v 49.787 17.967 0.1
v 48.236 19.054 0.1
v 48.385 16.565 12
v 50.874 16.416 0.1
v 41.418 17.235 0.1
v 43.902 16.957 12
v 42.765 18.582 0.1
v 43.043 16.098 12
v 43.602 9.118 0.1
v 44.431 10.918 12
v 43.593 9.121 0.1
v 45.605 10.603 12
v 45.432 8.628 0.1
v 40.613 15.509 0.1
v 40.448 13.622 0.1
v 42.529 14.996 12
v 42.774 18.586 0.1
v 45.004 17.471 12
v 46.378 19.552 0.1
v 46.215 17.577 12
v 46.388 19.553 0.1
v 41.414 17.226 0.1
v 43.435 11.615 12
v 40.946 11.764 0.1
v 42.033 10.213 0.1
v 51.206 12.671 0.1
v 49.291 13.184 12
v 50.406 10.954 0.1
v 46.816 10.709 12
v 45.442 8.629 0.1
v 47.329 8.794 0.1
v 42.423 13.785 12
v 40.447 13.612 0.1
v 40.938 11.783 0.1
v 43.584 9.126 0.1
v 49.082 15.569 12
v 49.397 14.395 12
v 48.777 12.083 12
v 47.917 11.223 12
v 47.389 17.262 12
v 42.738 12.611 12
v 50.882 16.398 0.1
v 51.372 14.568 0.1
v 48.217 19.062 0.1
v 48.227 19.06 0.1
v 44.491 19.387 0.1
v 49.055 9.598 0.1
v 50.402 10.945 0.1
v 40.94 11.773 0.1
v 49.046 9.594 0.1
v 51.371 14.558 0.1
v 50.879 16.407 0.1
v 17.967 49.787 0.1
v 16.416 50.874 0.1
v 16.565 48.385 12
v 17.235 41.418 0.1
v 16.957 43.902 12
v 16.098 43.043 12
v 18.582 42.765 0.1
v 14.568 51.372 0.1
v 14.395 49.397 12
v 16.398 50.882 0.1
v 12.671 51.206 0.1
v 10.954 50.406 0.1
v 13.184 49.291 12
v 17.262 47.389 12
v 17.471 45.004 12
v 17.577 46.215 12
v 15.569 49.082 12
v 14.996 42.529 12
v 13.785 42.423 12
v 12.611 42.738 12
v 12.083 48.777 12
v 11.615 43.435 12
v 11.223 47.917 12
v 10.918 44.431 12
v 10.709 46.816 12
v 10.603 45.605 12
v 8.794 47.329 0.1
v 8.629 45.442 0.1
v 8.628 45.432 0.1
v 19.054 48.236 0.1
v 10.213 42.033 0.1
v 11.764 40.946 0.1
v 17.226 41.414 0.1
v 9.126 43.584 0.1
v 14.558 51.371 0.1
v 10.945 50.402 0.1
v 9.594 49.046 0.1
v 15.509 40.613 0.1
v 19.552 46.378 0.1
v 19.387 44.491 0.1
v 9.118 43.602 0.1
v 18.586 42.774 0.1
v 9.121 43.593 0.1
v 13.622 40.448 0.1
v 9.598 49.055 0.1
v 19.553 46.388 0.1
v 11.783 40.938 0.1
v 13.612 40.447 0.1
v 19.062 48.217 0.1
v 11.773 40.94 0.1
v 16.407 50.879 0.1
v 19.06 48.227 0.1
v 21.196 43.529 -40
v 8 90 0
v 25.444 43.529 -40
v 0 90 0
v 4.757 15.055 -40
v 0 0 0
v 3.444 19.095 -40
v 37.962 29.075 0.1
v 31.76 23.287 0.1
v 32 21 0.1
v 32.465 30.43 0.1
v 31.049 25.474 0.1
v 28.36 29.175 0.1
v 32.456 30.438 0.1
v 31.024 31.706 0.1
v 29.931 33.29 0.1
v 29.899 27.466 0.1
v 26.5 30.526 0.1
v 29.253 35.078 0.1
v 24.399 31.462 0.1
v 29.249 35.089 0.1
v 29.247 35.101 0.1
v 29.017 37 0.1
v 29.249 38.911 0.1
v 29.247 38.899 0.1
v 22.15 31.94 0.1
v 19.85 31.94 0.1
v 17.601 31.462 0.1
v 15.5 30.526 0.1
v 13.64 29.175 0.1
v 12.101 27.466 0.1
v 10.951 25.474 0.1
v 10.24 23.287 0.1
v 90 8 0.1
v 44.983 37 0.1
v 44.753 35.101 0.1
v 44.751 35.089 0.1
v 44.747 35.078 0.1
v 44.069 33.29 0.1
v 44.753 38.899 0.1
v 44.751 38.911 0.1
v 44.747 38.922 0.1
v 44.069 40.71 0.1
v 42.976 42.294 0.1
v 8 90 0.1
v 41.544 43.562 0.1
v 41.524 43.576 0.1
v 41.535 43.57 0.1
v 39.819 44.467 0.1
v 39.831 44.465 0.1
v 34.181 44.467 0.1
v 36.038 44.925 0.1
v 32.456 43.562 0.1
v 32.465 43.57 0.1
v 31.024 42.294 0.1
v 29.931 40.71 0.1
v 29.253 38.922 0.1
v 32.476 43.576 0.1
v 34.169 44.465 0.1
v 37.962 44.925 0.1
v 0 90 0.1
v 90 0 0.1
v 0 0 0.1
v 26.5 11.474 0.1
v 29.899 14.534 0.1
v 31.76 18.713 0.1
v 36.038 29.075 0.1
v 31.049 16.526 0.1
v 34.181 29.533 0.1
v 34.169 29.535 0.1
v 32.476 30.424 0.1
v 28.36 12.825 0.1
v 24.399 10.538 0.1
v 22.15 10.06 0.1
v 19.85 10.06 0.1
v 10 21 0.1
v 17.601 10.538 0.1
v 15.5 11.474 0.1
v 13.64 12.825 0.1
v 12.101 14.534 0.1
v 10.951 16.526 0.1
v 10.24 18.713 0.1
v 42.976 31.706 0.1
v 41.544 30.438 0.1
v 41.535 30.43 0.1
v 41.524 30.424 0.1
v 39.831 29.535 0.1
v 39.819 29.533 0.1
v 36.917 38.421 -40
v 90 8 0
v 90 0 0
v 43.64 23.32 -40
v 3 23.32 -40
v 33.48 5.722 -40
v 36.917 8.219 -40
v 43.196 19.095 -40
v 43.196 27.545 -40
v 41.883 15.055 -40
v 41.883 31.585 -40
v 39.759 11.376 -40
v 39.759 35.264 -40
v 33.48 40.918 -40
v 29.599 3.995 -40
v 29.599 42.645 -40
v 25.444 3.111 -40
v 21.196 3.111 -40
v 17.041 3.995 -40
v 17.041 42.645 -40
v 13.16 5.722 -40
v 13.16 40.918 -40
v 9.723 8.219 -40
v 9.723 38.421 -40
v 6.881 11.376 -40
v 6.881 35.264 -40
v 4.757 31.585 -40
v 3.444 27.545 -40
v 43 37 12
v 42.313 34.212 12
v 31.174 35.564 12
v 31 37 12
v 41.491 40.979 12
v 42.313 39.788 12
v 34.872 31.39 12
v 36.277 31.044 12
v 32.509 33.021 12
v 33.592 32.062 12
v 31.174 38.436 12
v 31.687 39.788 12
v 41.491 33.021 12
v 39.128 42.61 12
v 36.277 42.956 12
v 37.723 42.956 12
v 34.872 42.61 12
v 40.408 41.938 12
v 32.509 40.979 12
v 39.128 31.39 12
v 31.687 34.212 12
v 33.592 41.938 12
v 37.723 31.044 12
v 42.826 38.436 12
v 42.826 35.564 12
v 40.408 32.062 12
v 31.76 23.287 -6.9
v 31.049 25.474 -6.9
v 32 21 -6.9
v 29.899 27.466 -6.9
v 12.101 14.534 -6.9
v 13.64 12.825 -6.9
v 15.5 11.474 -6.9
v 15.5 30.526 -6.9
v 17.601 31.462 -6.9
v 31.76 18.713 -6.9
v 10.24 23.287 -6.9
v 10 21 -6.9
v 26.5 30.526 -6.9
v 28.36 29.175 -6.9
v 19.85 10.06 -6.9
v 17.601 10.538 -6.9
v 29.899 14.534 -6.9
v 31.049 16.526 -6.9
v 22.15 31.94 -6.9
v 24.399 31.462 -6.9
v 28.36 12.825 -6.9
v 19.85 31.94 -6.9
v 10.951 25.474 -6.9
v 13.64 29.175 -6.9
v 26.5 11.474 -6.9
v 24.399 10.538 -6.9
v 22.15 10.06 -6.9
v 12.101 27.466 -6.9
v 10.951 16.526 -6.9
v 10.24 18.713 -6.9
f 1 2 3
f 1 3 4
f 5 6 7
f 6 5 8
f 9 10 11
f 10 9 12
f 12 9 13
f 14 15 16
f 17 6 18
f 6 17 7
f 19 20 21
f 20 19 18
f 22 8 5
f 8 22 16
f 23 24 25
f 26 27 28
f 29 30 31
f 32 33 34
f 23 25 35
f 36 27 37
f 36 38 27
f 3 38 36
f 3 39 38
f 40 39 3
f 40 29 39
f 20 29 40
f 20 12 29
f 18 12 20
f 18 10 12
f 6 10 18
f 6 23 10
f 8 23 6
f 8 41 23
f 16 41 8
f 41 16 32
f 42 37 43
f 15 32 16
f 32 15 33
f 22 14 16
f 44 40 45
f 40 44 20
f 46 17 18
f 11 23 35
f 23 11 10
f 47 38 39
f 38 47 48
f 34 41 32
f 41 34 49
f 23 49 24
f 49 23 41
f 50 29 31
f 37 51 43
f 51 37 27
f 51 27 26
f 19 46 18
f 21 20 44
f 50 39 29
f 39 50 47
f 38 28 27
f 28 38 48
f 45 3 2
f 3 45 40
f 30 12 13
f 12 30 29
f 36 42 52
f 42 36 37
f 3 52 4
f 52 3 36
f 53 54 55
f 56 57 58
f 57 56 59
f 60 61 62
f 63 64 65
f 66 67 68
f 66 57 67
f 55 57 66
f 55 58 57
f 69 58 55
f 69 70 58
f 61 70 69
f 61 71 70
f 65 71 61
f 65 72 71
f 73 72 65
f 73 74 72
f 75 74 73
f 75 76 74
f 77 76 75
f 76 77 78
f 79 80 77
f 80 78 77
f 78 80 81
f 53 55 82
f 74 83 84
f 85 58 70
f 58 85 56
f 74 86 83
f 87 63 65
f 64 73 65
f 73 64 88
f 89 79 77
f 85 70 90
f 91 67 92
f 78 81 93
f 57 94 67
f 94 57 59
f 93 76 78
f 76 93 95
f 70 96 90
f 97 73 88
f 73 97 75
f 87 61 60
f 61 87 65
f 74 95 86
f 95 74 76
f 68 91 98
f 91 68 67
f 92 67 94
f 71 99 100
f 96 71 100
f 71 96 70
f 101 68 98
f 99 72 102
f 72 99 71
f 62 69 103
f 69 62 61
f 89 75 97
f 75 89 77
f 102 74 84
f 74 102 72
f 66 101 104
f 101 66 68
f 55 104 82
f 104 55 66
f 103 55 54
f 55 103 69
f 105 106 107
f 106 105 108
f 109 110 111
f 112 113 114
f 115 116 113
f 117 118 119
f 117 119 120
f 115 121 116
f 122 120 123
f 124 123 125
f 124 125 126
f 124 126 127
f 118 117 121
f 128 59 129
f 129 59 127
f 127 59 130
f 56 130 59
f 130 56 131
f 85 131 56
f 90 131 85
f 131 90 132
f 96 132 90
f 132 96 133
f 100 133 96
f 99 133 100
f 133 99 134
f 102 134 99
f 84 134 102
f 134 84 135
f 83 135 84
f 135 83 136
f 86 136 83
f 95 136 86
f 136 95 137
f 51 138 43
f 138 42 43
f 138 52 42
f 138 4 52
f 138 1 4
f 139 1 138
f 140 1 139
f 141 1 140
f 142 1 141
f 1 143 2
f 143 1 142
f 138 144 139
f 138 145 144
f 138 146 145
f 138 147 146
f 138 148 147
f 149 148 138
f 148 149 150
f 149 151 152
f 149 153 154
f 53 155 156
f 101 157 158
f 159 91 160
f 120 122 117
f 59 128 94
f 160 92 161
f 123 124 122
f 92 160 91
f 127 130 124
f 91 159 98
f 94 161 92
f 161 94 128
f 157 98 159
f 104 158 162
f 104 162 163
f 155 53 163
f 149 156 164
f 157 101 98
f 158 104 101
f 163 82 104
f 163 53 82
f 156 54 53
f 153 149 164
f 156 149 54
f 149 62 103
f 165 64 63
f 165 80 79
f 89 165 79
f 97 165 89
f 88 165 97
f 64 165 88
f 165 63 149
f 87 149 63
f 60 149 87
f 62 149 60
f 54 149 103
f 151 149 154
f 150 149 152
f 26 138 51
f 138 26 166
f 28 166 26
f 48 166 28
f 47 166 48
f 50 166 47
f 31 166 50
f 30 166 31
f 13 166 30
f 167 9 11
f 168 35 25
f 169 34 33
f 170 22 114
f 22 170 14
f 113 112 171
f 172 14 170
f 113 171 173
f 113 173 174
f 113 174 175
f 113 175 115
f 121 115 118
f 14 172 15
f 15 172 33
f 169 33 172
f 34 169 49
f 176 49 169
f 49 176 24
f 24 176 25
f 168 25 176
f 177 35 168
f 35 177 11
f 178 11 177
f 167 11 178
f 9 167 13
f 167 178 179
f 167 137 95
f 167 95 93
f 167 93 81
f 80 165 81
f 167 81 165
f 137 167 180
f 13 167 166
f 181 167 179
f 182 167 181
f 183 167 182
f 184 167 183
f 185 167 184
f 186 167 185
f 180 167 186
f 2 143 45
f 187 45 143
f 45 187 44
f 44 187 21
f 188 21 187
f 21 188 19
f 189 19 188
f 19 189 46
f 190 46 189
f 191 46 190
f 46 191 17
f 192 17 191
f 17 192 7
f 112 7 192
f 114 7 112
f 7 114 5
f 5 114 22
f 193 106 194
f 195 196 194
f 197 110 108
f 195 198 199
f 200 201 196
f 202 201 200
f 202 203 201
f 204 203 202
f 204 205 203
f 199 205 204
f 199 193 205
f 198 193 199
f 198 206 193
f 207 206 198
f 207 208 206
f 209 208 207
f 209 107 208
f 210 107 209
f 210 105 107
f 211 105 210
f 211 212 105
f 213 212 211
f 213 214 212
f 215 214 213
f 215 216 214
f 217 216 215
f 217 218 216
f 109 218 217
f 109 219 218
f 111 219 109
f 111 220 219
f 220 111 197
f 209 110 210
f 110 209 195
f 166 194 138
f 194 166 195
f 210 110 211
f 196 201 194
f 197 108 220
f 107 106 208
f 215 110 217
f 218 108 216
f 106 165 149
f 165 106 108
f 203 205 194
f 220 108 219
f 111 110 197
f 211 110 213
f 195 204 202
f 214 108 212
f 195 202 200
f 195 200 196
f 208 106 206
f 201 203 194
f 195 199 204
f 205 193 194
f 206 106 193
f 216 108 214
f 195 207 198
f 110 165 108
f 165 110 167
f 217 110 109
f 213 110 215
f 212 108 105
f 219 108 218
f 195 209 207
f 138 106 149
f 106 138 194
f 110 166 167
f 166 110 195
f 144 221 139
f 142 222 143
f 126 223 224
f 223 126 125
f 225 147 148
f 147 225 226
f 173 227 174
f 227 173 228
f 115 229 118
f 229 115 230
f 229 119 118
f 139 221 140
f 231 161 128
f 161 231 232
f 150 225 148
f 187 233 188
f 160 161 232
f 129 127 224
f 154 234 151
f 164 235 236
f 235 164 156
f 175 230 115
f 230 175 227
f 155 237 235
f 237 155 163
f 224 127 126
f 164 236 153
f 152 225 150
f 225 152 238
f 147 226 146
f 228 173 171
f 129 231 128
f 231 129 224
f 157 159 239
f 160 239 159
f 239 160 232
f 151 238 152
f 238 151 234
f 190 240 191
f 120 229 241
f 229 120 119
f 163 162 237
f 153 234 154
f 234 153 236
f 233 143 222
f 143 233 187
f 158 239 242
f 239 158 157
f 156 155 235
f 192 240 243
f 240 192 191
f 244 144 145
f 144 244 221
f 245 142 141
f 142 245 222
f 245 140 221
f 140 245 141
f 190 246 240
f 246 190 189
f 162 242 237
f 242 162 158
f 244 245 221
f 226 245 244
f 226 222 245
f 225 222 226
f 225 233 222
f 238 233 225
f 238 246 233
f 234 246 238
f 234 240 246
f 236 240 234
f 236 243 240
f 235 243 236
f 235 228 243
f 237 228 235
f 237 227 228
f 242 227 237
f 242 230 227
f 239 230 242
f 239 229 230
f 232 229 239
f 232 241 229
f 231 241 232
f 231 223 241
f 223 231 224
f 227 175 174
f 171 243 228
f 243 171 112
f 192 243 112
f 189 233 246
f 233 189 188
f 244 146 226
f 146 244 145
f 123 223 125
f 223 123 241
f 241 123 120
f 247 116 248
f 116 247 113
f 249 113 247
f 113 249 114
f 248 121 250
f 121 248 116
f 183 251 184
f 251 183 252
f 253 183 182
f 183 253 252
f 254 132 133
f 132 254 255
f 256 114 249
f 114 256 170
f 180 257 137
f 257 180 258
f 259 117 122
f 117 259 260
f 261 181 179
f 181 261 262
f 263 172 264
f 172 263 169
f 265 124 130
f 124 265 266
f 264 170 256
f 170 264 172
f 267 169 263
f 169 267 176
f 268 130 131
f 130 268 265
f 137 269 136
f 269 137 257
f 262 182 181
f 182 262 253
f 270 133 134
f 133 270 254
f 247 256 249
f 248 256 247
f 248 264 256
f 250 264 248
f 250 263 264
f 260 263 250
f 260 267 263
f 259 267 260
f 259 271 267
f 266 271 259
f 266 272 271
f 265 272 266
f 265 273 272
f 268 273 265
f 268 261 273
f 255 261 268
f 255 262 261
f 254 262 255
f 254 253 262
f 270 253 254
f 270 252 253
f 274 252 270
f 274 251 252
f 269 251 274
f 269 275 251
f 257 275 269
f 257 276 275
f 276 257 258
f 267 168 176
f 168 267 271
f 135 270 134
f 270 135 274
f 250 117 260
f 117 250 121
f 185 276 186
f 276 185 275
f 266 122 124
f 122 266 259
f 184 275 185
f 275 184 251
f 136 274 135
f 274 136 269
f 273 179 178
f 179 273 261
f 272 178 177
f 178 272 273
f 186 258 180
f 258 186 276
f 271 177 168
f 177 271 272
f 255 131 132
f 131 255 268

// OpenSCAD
extra=8;
base=90;
base_h=40;
pad=0.1;
padd=pad*2;
in=25.4;
felt=1.6*in;
felt_h=1;
from_edge=3;

dip=22;
dip_h=7;
dip_offset=21;
screw_h=12;
big_d2=16;
big_d1=big_d2-4;
small_d2=11;
small_d1=small_d2-4;
big_offset=37;

small_gap=45;
small_offset=30;


module top() {
    difference() {
        cube([base,base,pad]);
        translate([base+extra,0,0])
        rotate([0,0,45])
        translate([0,-base/2,-pad])
        cube([base*2,base*2,pad*3]);
    }
}

module positive() {
    hull() {
        top();
        translate([felt/2+from_edge,felt/2+from_edge,-base_h])
        cylinder(d=felt,h=felt_h);
    }
    // big screw
    translate([big_offset,big_offset,0])
    cylinder(d2=big_d1,d1=big_d2,h=screw_h);

    translate([small_offset,small_offset,0])
    rotate([0,0,45]) {
        translate([0,-small_gap/2,0])
        cylinder(d1=small_d2,d2=small_d1,h=screw_h);
        translate([0,small_gap/2,0])
        cylinder(d1=small_d2,d2=small_d1,h=screw_h);
    }
}

difference() {
    positive();
    translate([dip_offset,dip_offset,-dip_h+pad])
    cylinder(d=dip,h=dip_h+pad);
}
